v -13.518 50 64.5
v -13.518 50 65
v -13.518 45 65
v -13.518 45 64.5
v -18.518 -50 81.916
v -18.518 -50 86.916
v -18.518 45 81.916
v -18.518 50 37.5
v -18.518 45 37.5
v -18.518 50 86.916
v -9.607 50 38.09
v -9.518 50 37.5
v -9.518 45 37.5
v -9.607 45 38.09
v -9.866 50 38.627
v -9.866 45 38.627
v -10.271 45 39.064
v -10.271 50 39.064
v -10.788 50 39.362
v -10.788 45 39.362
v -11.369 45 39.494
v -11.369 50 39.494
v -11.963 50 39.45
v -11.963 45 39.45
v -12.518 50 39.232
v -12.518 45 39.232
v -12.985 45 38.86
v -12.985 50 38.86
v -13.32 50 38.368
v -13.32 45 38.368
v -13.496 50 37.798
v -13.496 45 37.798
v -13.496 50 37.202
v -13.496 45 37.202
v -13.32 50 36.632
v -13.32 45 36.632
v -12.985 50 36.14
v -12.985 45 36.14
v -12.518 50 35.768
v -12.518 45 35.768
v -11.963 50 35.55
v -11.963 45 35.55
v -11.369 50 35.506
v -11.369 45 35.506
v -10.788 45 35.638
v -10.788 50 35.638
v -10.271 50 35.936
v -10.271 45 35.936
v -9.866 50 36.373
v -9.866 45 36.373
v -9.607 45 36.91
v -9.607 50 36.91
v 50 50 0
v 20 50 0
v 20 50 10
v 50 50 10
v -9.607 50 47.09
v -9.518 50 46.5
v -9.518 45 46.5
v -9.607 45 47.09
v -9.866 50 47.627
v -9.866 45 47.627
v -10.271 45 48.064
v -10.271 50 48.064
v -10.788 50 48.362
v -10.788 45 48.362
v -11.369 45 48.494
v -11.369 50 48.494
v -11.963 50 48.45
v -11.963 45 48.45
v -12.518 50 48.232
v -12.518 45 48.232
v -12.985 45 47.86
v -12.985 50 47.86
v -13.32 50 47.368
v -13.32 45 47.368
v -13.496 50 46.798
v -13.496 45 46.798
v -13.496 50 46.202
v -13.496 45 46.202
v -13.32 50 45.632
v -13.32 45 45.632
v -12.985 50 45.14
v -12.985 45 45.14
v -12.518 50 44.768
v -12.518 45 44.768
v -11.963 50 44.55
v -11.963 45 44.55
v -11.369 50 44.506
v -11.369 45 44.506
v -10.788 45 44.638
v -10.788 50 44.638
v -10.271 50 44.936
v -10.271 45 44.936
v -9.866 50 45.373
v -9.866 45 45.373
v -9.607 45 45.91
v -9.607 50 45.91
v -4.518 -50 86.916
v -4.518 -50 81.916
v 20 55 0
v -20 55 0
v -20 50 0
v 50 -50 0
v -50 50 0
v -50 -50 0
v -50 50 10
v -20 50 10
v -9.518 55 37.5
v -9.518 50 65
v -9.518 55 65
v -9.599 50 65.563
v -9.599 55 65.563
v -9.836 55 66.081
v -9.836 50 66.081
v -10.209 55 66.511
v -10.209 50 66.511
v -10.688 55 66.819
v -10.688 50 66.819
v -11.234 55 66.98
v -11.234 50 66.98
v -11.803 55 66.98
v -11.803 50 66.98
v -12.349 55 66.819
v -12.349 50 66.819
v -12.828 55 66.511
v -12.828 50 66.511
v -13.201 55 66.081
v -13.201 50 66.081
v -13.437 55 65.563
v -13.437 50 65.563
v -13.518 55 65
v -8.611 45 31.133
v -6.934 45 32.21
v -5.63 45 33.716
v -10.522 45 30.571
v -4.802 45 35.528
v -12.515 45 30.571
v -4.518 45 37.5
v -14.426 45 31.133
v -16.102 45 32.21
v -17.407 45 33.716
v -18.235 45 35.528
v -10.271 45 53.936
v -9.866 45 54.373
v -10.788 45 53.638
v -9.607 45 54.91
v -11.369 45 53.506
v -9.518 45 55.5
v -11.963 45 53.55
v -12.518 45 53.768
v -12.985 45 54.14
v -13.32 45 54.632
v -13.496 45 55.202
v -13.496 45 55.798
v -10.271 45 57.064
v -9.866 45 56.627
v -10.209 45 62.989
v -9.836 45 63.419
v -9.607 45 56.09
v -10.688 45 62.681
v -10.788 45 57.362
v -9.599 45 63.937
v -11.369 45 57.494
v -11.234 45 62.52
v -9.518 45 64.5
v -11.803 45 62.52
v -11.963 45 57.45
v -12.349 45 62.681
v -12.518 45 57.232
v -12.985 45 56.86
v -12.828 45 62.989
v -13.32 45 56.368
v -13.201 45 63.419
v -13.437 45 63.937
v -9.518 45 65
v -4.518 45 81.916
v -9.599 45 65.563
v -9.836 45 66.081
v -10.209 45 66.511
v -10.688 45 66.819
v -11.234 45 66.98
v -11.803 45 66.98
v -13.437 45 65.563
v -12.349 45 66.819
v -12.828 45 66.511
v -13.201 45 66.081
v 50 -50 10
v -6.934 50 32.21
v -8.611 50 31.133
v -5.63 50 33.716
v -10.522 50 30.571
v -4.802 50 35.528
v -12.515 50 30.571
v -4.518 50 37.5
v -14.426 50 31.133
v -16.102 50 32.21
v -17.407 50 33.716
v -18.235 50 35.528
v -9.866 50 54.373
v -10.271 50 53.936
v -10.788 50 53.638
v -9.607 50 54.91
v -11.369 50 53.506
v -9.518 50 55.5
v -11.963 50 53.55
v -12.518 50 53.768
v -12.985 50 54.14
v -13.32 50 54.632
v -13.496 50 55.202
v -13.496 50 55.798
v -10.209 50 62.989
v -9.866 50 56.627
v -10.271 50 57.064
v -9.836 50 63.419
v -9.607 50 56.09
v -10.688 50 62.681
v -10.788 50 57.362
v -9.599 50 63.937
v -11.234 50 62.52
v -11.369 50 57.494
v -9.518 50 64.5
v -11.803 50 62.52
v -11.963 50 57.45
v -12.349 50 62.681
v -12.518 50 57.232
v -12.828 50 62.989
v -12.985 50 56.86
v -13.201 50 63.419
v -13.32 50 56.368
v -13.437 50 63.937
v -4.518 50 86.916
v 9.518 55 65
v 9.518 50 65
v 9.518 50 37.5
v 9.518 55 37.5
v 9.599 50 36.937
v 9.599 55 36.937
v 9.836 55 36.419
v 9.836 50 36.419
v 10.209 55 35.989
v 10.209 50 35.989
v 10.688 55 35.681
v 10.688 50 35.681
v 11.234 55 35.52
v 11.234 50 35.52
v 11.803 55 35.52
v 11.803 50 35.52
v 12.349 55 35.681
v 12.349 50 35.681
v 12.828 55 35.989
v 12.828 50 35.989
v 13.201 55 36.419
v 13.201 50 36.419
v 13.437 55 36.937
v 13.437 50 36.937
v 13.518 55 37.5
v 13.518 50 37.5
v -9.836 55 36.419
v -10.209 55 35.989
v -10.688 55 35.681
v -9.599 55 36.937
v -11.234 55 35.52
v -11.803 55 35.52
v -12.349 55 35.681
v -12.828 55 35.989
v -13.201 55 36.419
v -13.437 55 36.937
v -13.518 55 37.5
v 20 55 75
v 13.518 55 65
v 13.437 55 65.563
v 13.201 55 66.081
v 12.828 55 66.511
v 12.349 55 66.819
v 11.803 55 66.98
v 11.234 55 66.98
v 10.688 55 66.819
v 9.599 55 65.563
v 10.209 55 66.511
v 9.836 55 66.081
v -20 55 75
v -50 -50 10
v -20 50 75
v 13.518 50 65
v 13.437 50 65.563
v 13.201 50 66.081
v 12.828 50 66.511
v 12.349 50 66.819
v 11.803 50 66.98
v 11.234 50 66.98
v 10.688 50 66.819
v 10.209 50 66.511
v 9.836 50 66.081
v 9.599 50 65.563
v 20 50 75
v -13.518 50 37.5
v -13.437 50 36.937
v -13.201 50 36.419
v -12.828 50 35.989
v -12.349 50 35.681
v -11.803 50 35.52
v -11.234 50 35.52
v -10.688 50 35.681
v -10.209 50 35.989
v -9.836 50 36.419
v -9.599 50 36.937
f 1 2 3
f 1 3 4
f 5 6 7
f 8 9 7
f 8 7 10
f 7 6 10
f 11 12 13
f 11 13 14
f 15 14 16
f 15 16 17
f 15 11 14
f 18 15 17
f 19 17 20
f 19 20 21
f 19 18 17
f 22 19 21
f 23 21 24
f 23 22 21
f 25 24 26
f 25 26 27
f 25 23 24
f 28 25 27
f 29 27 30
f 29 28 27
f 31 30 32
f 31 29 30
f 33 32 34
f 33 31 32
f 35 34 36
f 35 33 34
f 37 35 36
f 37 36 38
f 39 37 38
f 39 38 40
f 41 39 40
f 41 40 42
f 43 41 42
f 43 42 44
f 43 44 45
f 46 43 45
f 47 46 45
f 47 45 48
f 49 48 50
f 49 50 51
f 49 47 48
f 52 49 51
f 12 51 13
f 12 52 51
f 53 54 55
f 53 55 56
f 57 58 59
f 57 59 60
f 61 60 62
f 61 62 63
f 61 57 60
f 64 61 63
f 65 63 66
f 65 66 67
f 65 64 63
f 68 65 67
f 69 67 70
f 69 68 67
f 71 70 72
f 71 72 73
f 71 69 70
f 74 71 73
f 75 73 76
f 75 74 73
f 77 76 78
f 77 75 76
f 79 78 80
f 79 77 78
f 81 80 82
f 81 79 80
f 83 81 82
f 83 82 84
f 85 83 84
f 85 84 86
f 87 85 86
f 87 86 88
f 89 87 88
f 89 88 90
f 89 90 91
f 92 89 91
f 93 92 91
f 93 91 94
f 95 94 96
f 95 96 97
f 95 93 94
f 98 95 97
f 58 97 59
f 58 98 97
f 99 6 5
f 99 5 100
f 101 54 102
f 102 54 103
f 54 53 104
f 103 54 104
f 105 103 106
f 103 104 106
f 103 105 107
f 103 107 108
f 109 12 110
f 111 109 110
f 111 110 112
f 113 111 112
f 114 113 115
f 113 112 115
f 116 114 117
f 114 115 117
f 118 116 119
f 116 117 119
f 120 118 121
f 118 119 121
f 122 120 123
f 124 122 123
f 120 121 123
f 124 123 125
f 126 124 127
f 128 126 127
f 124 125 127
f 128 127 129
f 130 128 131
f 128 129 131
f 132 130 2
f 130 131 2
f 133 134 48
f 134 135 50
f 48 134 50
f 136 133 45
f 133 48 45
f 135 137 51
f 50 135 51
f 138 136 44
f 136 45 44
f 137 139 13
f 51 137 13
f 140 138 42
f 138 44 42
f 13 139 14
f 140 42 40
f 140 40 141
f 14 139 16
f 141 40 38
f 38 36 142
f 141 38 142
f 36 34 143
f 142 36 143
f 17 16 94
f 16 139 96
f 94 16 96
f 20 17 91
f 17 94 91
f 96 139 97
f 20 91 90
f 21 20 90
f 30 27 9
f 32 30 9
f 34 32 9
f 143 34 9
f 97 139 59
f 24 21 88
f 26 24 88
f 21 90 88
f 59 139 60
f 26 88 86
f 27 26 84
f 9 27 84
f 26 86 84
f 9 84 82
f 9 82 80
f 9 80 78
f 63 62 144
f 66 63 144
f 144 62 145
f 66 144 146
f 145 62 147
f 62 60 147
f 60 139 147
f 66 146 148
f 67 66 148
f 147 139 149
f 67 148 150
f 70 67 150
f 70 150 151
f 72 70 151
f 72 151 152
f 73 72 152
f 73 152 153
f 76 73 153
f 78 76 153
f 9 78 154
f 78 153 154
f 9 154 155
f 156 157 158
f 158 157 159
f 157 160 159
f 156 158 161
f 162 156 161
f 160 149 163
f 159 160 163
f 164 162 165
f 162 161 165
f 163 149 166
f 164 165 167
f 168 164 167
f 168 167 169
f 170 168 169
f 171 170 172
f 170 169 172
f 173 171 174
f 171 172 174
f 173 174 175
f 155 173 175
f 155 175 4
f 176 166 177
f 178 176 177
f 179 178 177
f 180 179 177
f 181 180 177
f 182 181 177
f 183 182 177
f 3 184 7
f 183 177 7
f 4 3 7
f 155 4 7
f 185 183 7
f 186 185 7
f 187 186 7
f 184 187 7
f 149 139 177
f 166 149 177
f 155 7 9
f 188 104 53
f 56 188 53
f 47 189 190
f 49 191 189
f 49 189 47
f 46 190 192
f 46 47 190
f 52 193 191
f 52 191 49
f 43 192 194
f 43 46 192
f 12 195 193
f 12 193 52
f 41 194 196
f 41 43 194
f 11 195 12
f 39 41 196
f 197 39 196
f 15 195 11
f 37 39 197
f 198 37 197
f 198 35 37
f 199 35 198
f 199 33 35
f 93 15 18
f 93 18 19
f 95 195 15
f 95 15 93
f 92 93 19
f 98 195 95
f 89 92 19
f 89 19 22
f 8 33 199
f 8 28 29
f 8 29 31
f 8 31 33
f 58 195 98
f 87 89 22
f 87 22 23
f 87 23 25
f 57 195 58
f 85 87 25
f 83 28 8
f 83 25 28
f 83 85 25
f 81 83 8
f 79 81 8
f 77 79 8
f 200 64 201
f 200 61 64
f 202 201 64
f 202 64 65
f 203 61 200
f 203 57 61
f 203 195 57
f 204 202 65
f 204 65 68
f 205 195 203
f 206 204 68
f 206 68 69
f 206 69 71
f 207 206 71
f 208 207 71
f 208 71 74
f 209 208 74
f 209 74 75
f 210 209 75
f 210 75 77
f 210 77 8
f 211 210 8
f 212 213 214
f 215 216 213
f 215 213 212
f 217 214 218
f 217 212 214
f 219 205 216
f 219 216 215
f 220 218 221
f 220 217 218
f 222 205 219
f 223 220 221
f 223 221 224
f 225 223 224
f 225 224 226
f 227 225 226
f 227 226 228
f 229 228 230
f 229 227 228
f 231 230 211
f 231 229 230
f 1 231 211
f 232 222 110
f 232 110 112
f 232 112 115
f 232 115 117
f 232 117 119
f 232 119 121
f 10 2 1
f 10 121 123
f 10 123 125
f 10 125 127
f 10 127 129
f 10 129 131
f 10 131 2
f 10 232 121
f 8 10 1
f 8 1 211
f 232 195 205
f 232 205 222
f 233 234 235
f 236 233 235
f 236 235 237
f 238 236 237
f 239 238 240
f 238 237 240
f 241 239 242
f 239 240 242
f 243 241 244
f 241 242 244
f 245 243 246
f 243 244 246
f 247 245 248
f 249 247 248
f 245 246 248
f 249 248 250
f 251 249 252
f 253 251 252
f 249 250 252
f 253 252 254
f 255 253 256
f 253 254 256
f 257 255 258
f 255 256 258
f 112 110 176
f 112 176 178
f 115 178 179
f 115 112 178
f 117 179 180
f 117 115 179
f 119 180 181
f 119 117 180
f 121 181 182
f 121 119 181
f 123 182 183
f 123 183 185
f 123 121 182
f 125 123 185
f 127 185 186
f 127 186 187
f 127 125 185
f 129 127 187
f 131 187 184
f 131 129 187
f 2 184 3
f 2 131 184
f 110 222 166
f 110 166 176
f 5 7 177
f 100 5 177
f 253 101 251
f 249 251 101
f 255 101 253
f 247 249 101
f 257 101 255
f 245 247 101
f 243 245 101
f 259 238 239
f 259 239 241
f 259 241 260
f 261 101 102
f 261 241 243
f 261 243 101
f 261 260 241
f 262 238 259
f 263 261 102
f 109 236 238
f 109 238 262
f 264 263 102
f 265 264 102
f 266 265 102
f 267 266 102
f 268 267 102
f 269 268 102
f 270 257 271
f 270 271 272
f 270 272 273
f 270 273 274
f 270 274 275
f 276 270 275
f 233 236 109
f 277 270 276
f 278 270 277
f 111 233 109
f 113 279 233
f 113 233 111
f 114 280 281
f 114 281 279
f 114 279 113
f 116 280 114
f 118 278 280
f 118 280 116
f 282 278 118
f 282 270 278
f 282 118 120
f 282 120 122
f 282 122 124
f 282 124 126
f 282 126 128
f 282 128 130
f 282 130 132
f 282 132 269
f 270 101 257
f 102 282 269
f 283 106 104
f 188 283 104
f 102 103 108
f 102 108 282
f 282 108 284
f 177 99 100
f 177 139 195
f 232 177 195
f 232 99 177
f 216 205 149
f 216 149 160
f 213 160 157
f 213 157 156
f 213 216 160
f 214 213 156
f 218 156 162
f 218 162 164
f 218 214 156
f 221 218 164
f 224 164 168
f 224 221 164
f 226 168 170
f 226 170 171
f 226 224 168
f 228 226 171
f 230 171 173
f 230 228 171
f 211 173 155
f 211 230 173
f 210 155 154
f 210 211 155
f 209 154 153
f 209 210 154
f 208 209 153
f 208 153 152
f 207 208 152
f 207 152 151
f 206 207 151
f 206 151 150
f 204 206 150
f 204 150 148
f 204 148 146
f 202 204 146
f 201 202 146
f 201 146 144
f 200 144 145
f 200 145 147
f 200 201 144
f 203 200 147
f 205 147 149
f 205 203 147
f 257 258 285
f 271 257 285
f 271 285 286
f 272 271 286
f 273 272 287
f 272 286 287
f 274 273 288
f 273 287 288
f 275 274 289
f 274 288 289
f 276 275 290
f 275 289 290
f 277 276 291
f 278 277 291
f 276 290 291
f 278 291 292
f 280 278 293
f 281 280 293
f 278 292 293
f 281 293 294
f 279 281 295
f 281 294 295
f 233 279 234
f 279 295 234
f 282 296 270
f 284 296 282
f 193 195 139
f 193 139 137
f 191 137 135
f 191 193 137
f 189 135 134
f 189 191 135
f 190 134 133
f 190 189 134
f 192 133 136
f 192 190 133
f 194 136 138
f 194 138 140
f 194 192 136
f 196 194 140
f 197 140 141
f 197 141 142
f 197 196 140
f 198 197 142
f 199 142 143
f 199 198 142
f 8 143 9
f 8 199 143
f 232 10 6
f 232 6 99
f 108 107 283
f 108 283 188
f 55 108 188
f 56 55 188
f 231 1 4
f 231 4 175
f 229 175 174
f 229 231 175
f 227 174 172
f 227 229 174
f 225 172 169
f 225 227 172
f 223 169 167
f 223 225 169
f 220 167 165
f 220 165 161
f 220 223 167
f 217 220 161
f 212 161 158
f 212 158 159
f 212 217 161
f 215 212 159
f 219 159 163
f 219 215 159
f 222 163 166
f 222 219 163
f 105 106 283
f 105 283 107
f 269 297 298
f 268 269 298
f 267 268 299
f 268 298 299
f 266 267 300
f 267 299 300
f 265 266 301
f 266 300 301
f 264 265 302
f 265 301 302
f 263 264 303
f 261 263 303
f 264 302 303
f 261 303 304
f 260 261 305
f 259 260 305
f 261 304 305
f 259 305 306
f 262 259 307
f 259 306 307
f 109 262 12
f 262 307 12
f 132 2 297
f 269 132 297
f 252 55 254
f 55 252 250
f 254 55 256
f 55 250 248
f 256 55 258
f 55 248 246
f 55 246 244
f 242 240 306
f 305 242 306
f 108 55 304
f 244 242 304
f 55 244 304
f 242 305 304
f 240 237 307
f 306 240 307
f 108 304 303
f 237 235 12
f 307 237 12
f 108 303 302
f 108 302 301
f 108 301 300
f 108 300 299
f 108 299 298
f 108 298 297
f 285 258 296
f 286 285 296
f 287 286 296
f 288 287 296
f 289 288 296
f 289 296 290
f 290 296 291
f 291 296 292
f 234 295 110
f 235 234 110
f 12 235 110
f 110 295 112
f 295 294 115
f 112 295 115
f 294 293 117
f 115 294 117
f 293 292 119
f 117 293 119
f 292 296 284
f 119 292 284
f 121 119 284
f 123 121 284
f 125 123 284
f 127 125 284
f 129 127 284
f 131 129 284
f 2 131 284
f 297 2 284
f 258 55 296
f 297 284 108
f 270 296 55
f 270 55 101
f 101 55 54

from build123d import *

# Parameters (mm, degrees)
F3_W      = 100
F3_H      = 100
F4_DEPTH  = 10
F5_W      = 40
F5_H      = 65
F5_H_2    = 10
F6_DEPTH  = 5
F7_W      = 14
F7_H      = 6.915564537
F7_H_2    = 5
F8_DEPTH  = 5
F9_W      = 14
F9_H      = 95
F10_DEPTH = 5


with BuildPart() as f4:
    # F3 (on Top) → F4 (new body)
    with BuildSketch(Plane.XY):
        Rectangle(F3_W, F3_H)
    extrude(amount=F4_DEPTH)

    # F5 (on face) → F6 (join)
    with BuildSketch(Plane(origin=(0, 50, 0), x_dir=(-1, 0, 0), z_dir=(0, 1, 0))):
        with Locations((0, 42.5)):
            Rectangle(F5_W, F5_H)
        with BuildLine():
            Line((-13.518457301, 37.5), (-13.518457301, 65))
            ThreePointArc((-13.518457301, 65), (-11.518457301, 67), (-9.518457301, 65))
            Line((-9.518457301, 65), (-9.518457301, 37.5))
            ThreePointArc((-9.518457301, 37.5), (-11.518457301, 35.5), (-13.518457301, 37.5))
        make_face(mode=Mode.SUBTRACT)
        with BuildLine():
            Line((9.518457301, 37.5), (9.518457301, 65))
            ThreePointArc((9.518457301, 65), (11.518457301, 67), (13.518457301, 65))
            Line((13.518457301, 65), (13.518457301, 37.5))
            ThreePointArc((13.518457301, 37.5), (11.518457301, 35.5), (9.518457301, 37.5))
        make_face(mode=Mode.SUBTRACT)
        with Locations((0, 5)):
            Rectangle(F5_W, F5_H_2)
    extrude(amount=F6_DEPTH)


with BuildPart() as f8:
    # F7 (on face) → F8 (new body)
    with BuildSketch(Plane(origin=(0, 50, 0), x_dir=(-1, 0, 0), z_dir=(0, 1, 0))):
        with BuildLine():
            Line((4.518457301, 75), (4.518457301, 37.5))
            ThreePointArc((4.518457301, 37.5), (11.518457301, 30.5), (18.518457301, 37.5))
            Line((18.518457301, 37.5), (18.518457301, 75))
            Line((18.518457301, 75), (4.518457301, 75))
        make_face()
        with BuildLine():
            Line((13.518457301, 46.5), (13.518457301, 37.5))
            ThreePointArc((13.518457301, 37.5), (11.518457301, 35.5), (9.518457301, 37.5))
            Line((9.518457301, 37.5), (9.518457301, 46.5))
            Line((9.518457301, 46.5), (9.518457301, 55.5))
            Line((9.518457301, 55.5), (9.518457301, 64.5))
            Line((9.518457301, 64.5), (9.518457301, 65))
            ThreePointArc((9.518457301, 65), (11.518457301, 67), (13.518457301, 65))
            Line((13.518457301, 65), (13.518457301, 64.5))
            Line((13.518457301, 64.5), (13.518457301, 55.5))
            Line((13.518457301, 55.5), (13.518457301, 46.5))
        make_face(mode=Mode.SUBTRACT)
        with Locations((11.518457301, 78.4577822685)):
            Rectangle(F7_W, F7_H)
        with Locations((11.518457301, 84.415564537)):
            Rectangle(F7_W, F7_H_2)
        with BuildLine():
            ThreePointArc((9.518457301, 37.5), (11.518457301, 39.5), (13.518457301, 37.5))
            Line((13.518457301, 37.5), (13.518457301, 46.5))
            ThreePointArc((13.518457301, 46.5), (11.518457301, 44.5), (9.518457301, 46.5))
            Line((9.518457301, 46.5), (9.518457301, 37.5))
        make_face()
        with BuildLine():
            ThreePointArc((9.518457301, 46.5), (11.518457301, 48.5), (13.518457301, 46.5))
            Line((13.518457301, 46.5), (13.518457301, 55.5))
            ThreePointArc((13.518457301, 55.5), (11.518457301, 53.5), (9.518457301, 55.5))
            Line((9.518457301, 55.5), (9.518457301, 46.5))
        make_face()
        with BuildLine():
            ThreePointArc((9.518457301, 55.5), (11.518457301, 57.5), (13.518457301, 55.5))
            Line((13.518457301, 55.5), (13.518457301, 64.5))
            ThreePointArc((13.518457301, 64.5), (11.518457301, 62.5), (9.518457301, 64.5))
            Line((9.518457301, 64.5), (9.518457301, 55.5))
        make_face()
    extrude(amount=-F8_DEPTH)

    # F9 (on face) → F10 (join)
    with BuildSketch(Plane.XY.offset(86.915564537)):
        with Locations((-11.518457301, -2.5)):
            Rectangle(F9_W, F9_H)
    extrude(amount=-F10_DEPTH)


solid = Compound([f4.part, f8.part])
